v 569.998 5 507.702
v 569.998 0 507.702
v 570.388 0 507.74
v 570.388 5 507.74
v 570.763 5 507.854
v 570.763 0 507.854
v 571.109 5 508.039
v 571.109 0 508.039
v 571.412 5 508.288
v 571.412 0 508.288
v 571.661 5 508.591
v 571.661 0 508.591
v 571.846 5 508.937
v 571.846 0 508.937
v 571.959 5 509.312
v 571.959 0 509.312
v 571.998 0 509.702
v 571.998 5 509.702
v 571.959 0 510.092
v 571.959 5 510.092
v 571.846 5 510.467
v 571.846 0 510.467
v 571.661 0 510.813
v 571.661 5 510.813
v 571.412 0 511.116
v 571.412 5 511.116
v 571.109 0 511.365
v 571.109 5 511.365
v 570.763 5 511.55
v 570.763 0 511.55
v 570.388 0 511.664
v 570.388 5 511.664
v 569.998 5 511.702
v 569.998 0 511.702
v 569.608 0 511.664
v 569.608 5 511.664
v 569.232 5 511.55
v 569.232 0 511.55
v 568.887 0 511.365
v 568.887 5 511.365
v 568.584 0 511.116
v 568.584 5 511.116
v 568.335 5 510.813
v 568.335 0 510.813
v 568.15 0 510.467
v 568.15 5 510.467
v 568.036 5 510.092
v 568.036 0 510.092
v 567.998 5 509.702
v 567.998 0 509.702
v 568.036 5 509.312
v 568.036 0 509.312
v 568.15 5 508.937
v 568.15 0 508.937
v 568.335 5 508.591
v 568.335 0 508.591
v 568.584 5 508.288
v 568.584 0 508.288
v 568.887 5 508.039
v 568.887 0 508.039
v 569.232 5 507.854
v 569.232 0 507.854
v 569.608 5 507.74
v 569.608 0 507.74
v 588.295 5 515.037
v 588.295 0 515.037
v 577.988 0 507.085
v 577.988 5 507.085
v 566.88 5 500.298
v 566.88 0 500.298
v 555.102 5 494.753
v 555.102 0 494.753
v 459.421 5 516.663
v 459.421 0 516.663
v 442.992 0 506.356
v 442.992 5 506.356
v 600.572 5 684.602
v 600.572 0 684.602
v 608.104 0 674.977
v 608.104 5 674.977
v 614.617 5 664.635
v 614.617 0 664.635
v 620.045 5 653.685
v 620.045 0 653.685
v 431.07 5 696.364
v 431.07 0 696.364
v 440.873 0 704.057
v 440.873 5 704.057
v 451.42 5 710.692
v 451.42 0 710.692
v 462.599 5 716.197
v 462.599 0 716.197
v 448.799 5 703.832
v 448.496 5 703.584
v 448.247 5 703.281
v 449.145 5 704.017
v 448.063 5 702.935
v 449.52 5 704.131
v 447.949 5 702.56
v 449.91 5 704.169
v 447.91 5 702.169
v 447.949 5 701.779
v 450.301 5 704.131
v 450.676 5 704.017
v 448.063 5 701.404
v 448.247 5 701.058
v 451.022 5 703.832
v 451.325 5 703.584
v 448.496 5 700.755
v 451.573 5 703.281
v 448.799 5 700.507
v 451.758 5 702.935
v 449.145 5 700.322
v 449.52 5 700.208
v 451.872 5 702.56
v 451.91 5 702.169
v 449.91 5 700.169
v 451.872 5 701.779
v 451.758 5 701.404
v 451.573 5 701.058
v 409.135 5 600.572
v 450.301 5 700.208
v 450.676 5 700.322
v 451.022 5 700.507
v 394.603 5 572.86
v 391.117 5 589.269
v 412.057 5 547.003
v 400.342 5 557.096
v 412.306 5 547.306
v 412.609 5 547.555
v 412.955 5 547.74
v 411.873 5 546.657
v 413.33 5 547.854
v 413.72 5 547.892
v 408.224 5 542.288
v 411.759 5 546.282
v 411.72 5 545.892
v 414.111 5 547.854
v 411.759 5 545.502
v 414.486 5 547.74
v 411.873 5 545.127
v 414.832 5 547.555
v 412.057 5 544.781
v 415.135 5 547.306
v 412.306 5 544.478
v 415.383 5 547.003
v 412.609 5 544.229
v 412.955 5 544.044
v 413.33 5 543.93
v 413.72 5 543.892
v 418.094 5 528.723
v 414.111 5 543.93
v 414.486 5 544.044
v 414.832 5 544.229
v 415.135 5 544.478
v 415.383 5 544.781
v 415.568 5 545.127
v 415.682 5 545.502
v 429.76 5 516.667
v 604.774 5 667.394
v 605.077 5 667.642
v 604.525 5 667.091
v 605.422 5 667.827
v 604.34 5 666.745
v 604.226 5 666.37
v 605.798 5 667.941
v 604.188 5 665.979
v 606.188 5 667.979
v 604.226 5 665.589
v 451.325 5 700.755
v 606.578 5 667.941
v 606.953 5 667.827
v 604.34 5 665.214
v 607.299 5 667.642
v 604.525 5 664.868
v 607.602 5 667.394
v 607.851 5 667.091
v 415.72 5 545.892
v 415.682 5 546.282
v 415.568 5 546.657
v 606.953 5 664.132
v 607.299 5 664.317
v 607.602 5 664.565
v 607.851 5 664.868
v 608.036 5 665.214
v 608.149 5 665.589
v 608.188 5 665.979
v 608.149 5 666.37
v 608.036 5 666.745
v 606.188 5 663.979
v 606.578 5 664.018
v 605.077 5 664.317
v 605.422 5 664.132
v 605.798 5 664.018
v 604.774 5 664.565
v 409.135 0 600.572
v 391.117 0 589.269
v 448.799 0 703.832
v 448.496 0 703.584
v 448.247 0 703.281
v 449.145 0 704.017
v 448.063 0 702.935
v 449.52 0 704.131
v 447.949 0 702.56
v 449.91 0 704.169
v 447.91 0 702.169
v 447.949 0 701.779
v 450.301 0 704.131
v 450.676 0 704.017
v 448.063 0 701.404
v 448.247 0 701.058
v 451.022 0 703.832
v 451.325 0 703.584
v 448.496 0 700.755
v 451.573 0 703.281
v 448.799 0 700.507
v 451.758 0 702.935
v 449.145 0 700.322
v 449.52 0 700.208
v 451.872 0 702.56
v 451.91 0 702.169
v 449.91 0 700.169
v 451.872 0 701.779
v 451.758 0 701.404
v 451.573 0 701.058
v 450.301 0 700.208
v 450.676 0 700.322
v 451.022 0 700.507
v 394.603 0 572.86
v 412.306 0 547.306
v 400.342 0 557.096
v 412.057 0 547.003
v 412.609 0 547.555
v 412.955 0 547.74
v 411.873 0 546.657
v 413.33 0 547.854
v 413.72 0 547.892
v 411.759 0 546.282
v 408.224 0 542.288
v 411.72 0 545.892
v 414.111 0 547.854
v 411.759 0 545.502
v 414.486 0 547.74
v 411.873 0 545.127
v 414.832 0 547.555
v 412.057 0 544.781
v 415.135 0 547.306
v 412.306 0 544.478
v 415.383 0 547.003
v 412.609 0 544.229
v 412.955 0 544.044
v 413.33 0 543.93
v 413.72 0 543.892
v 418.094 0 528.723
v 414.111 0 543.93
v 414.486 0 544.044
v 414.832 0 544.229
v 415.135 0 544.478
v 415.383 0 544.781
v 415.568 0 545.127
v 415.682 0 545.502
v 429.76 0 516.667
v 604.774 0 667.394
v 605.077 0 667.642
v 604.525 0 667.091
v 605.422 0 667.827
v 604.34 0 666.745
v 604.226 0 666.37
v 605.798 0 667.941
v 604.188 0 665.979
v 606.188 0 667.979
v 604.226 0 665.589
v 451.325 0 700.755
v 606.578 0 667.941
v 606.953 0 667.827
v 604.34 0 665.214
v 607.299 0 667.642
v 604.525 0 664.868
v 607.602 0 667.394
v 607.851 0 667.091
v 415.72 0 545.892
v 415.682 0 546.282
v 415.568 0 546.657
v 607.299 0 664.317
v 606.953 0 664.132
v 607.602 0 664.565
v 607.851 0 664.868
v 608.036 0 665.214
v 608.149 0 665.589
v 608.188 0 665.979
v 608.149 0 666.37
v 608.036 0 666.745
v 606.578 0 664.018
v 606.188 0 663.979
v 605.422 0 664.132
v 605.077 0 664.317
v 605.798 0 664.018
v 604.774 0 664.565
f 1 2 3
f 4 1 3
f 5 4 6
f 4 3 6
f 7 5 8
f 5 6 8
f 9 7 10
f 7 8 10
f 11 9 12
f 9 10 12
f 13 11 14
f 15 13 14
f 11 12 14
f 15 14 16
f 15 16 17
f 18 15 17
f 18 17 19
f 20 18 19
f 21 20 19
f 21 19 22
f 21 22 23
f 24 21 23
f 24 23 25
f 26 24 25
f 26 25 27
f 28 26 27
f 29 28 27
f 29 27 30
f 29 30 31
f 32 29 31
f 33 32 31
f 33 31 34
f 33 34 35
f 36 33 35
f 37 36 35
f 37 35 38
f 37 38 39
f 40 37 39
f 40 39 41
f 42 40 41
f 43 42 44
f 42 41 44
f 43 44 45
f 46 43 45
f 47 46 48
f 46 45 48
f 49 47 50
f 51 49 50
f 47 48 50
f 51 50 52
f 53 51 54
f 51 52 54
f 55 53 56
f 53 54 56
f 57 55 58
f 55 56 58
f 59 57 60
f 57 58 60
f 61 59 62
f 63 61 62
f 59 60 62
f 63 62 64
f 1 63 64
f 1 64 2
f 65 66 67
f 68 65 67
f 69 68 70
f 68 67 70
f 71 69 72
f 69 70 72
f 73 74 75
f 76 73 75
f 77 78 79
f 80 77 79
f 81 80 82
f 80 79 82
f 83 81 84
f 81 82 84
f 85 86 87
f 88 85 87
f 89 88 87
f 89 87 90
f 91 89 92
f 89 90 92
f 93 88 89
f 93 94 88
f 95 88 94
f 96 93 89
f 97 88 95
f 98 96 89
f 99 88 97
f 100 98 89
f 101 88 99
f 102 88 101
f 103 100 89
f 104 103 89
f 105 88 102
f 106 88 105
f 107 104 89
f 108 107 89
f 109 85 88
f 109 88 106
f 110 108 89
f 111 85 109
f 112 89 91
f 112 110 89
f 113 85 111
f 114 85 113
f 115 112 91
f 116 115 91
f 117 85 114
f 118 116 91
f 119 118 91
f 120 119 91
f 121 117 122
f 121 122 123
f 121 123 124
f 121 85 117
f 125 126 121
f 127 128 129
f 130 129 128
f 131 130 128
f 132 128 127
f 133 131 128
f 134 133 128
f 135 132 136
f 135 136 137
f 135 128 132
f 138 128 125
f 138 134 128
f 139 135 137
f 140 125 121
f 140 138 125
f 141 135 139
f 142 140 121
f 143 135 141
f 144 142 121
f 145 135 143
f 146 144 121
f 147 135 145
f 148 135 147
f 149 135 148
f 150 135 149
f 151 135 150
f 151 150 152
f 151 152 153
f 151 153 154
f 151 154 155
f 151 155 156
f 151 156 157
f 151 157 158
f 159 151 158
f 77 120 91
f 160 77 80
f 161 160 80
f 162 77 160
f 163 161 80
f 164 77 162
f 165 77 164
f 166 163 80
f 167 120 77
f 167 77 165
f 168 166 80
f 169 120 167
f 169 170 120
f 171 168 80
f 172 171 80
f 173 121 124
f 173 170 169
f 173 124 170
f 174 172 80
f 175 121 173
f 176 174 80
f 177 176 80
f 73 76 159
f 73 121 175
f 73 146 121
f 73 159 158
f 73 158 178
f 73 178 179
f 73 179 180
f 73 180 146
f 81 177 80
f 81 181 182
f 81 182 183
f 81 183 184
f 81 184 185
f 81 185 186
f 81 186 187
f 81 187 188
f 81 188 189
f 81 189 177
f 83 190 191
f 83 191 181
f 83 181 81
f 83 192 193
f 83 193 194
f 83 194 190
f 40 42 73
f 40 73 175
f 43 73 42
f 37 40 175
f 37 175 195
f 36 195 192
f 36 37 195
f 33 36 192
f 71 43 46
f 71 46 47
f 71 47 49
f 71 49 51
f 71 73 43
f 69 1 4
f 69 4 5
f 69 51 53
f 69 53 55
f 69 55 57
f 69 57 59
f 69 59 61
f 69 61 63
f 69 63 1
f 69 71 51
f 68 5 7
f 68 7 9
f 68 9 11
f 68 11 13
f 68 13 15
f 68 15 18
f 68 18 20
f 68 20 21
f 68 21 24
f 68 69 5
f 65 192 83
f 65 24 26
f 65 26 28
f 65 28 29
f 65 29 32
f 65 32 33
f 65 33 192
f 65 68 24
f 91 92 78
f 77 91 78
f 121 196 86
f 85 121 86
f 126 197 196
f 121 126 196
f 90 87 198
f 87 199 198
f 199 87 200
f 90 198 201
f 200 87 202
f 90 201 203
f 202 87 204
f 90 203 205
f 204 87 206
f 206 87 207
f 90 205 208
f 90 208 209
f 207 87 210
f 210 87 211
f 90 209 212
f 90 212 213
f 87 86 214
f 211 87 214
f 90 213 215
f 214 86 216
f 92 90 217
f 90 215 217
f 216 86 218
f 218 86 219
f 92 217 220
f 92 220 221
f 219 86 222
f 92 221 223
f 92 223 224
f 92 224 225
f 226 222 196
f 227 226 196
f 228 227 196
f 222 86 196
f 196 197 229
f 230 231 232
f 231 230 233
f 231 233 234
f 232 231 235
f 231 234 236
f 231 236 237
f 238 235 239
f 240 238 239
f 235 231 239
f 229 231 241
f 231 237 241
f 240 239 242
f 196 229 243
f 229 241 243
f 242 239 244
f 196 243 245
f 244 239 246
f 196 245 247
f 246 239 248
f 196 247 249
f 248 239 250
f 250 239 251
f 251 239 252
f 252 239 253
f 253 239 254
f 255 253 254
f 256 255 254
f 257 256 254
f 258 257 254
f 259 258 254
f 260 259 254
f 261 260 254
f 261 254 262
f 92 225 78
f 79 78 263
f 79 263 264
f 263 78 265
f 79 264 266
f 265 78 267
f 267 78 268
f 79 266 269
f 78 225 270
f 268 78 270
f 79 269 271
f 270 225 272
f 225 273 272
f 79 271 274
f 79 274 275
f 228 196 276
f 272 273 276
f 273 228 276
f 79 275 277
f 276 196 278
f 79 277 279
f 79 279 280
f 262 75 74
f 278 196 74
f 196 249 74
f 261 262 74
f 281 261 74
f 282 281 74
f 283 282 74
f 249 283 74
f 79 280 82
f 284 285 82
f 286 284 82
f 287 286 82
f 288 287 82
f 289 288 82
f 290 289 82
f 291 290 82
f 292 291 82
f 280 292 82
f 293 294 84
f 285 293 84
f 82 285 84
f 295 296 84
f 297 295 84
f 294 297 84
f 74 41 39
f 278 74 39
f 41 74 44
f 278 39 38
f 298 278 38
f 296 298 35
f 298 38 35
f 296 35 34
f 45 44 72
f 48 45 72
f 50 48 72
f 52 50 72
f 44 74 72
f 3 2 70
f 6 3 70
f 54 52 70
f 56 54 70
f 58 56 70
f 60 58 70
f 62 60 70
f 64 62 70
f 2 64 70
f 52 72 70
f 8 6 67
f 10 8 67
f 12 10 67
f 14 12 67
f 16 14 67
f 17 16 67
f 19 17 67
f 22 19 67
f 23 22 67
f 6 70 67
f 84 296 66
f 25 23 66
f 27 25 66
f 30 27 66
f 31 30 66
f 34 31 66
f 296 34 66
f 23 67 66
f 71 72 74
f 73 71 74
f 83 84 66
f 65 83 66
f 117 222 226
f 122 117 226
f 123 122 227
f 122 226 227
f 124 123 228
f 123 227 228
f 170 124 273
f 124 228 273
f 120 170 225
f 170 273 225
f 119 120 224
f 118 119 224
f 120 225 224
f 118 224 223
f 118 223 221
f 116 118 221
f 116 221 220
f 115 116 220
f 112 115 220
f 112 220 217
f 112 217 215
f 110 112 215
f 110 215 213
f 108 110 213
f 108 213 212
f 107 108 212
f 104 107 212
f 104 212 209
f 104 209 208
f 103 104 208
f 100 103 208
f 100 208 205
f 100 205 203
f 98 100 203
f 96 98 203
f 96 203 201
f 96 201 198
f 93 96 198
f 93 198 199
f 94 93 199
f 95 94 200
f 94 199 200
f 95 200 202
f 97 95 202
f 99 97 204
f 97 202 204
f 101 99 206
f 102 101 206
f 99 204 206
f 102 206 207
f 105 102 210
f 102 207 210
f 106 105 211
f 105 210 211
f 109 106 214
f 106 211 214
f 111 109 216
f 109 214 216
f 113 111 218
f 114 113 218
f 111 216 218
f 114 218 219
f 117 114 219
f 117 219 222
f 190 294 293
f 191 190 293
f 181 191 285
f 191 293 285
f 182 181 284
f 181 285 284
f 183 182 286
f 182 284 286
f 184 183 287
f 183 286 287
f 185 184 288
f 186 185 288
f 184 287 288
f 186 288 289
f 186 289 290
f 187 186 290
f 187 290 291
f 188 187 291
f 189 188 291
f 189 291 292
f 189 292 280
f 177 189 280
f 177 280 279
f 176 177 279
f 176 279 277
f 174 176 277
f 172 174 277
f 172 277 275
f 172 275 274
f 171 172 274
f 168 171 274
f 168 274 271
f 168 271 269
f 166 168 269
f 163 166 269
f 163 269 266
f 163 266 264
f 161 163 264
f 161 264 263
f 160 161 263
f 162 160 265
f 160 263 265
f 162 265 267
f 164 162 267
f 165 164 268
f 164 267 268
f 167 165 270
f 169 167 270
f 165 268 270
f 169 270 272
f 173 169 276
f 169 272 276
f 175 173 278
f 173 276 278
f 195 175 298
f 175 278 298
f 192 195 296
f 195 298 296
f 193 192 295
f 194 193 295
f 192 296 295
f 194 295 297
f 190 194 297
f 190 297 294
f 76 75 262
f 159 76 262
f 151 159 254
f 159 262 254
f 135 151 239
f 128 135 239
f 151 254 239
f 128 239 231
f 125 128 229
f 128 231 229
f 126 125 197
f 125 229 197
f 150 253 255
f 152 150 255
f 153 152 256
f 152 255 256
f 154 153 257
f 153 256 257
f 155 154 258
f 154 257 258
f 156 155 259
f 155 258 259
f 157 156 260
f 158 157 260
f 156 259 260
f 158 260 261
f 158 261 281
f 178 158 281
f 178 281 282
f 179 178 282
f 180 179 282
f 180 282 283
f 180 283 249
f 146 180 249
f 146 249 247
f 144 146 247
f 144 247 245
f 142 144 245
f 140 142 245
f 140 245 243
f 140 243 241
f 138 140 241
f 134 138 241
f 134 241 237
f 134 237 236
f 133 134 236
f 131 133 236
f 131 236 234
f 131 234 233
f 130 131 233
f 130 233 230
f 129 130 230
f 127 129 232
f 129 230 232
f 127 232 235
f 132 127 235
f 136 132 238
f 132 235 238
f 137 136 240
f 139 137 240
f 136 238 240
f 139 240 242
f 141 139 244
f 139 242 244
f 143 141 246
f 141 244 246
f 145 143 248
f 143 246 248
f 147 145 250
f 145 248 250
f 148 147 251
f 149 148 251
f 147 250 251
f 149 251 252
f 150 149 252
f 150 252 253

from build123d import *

# Parameters (mm, degrees)
SALIENTE_EXTRUIR1_DEPTH = 5
CROQUIS3_R              = 2
CORTAR_EXTRUIR1_DEPTH   = 10


with BuildPart() as part:
    # Croquis1 → Saliente-Extruir1 (new body)
    with BuildSketch(Plane(origin=(0, 0, 0), x_dir=(1, 0, 0), z_dir=(0, 1, 0))):
        with BuildLine():
            Line((391.11715601, -589.26903854), (409.134507606, -600.572222265))
            Line((409.134507606, -600.572222265), (431.070113816, -696.364244316))
            ThreePointArc((431.070113816, -696.364244316), (446.060284595, -707.511220058), (462.598816983, -716.196681165))
            Line((462.598816983, -716.196681165), (600.572192141, -684.601882766))
            ThreePointArc((600.572192141, -684.601882766), (611.492139331, -669.889063268), (620.044894414, -653.685277145))
            Line((620.044894414, -653.685277145), (588.295487999, -515.036734211))
            ThreePointArc((588.295487999, -515.036734211), (572.526223432, -503.540761802), (555.102156346, -494.752760164))
            Line((555.102156346, -494.752760164), (459.421279691, -516.662914968))
            Line((459.421279691, -516.662914968), (442.992177211, -506.356119167))
            ThreePointArc((442.992177211, -506.356119167), (408.224347097, -542.287830533), (391.11715601, -589.26903854))
        make_face()
    extrude(amount=SALIENTE_EXTRUIR1_DEPTH)

    # Croquis3 → Cortar-Extruir1 (cut)
    with BuildSketch(Plane.XZ):
        with Locations(Location((449.910379391, 702.169476818, 0), (0, 0, 270))):
            Circle(CROQUIS3_R)
        with Locations(Location((413.720365983, 545.892005433, 0), (0, 0, 270))):
            Circle(CROQUIS3_R)
        with Locations(Location((569.997837367, 509.701992025, 0), (0, 0, 270))):
            Circle(CROQUIS3_R)
        with Locations(Location((606.187850775, 665.97946341, 0), (0, 0, 270))):
            Circle(CROQUIS3_R)
    extrude(amount=-CORTAR_EXTRUIR1_DEPTH, mode=Mode.SUBTRACT)


solid = part.part
